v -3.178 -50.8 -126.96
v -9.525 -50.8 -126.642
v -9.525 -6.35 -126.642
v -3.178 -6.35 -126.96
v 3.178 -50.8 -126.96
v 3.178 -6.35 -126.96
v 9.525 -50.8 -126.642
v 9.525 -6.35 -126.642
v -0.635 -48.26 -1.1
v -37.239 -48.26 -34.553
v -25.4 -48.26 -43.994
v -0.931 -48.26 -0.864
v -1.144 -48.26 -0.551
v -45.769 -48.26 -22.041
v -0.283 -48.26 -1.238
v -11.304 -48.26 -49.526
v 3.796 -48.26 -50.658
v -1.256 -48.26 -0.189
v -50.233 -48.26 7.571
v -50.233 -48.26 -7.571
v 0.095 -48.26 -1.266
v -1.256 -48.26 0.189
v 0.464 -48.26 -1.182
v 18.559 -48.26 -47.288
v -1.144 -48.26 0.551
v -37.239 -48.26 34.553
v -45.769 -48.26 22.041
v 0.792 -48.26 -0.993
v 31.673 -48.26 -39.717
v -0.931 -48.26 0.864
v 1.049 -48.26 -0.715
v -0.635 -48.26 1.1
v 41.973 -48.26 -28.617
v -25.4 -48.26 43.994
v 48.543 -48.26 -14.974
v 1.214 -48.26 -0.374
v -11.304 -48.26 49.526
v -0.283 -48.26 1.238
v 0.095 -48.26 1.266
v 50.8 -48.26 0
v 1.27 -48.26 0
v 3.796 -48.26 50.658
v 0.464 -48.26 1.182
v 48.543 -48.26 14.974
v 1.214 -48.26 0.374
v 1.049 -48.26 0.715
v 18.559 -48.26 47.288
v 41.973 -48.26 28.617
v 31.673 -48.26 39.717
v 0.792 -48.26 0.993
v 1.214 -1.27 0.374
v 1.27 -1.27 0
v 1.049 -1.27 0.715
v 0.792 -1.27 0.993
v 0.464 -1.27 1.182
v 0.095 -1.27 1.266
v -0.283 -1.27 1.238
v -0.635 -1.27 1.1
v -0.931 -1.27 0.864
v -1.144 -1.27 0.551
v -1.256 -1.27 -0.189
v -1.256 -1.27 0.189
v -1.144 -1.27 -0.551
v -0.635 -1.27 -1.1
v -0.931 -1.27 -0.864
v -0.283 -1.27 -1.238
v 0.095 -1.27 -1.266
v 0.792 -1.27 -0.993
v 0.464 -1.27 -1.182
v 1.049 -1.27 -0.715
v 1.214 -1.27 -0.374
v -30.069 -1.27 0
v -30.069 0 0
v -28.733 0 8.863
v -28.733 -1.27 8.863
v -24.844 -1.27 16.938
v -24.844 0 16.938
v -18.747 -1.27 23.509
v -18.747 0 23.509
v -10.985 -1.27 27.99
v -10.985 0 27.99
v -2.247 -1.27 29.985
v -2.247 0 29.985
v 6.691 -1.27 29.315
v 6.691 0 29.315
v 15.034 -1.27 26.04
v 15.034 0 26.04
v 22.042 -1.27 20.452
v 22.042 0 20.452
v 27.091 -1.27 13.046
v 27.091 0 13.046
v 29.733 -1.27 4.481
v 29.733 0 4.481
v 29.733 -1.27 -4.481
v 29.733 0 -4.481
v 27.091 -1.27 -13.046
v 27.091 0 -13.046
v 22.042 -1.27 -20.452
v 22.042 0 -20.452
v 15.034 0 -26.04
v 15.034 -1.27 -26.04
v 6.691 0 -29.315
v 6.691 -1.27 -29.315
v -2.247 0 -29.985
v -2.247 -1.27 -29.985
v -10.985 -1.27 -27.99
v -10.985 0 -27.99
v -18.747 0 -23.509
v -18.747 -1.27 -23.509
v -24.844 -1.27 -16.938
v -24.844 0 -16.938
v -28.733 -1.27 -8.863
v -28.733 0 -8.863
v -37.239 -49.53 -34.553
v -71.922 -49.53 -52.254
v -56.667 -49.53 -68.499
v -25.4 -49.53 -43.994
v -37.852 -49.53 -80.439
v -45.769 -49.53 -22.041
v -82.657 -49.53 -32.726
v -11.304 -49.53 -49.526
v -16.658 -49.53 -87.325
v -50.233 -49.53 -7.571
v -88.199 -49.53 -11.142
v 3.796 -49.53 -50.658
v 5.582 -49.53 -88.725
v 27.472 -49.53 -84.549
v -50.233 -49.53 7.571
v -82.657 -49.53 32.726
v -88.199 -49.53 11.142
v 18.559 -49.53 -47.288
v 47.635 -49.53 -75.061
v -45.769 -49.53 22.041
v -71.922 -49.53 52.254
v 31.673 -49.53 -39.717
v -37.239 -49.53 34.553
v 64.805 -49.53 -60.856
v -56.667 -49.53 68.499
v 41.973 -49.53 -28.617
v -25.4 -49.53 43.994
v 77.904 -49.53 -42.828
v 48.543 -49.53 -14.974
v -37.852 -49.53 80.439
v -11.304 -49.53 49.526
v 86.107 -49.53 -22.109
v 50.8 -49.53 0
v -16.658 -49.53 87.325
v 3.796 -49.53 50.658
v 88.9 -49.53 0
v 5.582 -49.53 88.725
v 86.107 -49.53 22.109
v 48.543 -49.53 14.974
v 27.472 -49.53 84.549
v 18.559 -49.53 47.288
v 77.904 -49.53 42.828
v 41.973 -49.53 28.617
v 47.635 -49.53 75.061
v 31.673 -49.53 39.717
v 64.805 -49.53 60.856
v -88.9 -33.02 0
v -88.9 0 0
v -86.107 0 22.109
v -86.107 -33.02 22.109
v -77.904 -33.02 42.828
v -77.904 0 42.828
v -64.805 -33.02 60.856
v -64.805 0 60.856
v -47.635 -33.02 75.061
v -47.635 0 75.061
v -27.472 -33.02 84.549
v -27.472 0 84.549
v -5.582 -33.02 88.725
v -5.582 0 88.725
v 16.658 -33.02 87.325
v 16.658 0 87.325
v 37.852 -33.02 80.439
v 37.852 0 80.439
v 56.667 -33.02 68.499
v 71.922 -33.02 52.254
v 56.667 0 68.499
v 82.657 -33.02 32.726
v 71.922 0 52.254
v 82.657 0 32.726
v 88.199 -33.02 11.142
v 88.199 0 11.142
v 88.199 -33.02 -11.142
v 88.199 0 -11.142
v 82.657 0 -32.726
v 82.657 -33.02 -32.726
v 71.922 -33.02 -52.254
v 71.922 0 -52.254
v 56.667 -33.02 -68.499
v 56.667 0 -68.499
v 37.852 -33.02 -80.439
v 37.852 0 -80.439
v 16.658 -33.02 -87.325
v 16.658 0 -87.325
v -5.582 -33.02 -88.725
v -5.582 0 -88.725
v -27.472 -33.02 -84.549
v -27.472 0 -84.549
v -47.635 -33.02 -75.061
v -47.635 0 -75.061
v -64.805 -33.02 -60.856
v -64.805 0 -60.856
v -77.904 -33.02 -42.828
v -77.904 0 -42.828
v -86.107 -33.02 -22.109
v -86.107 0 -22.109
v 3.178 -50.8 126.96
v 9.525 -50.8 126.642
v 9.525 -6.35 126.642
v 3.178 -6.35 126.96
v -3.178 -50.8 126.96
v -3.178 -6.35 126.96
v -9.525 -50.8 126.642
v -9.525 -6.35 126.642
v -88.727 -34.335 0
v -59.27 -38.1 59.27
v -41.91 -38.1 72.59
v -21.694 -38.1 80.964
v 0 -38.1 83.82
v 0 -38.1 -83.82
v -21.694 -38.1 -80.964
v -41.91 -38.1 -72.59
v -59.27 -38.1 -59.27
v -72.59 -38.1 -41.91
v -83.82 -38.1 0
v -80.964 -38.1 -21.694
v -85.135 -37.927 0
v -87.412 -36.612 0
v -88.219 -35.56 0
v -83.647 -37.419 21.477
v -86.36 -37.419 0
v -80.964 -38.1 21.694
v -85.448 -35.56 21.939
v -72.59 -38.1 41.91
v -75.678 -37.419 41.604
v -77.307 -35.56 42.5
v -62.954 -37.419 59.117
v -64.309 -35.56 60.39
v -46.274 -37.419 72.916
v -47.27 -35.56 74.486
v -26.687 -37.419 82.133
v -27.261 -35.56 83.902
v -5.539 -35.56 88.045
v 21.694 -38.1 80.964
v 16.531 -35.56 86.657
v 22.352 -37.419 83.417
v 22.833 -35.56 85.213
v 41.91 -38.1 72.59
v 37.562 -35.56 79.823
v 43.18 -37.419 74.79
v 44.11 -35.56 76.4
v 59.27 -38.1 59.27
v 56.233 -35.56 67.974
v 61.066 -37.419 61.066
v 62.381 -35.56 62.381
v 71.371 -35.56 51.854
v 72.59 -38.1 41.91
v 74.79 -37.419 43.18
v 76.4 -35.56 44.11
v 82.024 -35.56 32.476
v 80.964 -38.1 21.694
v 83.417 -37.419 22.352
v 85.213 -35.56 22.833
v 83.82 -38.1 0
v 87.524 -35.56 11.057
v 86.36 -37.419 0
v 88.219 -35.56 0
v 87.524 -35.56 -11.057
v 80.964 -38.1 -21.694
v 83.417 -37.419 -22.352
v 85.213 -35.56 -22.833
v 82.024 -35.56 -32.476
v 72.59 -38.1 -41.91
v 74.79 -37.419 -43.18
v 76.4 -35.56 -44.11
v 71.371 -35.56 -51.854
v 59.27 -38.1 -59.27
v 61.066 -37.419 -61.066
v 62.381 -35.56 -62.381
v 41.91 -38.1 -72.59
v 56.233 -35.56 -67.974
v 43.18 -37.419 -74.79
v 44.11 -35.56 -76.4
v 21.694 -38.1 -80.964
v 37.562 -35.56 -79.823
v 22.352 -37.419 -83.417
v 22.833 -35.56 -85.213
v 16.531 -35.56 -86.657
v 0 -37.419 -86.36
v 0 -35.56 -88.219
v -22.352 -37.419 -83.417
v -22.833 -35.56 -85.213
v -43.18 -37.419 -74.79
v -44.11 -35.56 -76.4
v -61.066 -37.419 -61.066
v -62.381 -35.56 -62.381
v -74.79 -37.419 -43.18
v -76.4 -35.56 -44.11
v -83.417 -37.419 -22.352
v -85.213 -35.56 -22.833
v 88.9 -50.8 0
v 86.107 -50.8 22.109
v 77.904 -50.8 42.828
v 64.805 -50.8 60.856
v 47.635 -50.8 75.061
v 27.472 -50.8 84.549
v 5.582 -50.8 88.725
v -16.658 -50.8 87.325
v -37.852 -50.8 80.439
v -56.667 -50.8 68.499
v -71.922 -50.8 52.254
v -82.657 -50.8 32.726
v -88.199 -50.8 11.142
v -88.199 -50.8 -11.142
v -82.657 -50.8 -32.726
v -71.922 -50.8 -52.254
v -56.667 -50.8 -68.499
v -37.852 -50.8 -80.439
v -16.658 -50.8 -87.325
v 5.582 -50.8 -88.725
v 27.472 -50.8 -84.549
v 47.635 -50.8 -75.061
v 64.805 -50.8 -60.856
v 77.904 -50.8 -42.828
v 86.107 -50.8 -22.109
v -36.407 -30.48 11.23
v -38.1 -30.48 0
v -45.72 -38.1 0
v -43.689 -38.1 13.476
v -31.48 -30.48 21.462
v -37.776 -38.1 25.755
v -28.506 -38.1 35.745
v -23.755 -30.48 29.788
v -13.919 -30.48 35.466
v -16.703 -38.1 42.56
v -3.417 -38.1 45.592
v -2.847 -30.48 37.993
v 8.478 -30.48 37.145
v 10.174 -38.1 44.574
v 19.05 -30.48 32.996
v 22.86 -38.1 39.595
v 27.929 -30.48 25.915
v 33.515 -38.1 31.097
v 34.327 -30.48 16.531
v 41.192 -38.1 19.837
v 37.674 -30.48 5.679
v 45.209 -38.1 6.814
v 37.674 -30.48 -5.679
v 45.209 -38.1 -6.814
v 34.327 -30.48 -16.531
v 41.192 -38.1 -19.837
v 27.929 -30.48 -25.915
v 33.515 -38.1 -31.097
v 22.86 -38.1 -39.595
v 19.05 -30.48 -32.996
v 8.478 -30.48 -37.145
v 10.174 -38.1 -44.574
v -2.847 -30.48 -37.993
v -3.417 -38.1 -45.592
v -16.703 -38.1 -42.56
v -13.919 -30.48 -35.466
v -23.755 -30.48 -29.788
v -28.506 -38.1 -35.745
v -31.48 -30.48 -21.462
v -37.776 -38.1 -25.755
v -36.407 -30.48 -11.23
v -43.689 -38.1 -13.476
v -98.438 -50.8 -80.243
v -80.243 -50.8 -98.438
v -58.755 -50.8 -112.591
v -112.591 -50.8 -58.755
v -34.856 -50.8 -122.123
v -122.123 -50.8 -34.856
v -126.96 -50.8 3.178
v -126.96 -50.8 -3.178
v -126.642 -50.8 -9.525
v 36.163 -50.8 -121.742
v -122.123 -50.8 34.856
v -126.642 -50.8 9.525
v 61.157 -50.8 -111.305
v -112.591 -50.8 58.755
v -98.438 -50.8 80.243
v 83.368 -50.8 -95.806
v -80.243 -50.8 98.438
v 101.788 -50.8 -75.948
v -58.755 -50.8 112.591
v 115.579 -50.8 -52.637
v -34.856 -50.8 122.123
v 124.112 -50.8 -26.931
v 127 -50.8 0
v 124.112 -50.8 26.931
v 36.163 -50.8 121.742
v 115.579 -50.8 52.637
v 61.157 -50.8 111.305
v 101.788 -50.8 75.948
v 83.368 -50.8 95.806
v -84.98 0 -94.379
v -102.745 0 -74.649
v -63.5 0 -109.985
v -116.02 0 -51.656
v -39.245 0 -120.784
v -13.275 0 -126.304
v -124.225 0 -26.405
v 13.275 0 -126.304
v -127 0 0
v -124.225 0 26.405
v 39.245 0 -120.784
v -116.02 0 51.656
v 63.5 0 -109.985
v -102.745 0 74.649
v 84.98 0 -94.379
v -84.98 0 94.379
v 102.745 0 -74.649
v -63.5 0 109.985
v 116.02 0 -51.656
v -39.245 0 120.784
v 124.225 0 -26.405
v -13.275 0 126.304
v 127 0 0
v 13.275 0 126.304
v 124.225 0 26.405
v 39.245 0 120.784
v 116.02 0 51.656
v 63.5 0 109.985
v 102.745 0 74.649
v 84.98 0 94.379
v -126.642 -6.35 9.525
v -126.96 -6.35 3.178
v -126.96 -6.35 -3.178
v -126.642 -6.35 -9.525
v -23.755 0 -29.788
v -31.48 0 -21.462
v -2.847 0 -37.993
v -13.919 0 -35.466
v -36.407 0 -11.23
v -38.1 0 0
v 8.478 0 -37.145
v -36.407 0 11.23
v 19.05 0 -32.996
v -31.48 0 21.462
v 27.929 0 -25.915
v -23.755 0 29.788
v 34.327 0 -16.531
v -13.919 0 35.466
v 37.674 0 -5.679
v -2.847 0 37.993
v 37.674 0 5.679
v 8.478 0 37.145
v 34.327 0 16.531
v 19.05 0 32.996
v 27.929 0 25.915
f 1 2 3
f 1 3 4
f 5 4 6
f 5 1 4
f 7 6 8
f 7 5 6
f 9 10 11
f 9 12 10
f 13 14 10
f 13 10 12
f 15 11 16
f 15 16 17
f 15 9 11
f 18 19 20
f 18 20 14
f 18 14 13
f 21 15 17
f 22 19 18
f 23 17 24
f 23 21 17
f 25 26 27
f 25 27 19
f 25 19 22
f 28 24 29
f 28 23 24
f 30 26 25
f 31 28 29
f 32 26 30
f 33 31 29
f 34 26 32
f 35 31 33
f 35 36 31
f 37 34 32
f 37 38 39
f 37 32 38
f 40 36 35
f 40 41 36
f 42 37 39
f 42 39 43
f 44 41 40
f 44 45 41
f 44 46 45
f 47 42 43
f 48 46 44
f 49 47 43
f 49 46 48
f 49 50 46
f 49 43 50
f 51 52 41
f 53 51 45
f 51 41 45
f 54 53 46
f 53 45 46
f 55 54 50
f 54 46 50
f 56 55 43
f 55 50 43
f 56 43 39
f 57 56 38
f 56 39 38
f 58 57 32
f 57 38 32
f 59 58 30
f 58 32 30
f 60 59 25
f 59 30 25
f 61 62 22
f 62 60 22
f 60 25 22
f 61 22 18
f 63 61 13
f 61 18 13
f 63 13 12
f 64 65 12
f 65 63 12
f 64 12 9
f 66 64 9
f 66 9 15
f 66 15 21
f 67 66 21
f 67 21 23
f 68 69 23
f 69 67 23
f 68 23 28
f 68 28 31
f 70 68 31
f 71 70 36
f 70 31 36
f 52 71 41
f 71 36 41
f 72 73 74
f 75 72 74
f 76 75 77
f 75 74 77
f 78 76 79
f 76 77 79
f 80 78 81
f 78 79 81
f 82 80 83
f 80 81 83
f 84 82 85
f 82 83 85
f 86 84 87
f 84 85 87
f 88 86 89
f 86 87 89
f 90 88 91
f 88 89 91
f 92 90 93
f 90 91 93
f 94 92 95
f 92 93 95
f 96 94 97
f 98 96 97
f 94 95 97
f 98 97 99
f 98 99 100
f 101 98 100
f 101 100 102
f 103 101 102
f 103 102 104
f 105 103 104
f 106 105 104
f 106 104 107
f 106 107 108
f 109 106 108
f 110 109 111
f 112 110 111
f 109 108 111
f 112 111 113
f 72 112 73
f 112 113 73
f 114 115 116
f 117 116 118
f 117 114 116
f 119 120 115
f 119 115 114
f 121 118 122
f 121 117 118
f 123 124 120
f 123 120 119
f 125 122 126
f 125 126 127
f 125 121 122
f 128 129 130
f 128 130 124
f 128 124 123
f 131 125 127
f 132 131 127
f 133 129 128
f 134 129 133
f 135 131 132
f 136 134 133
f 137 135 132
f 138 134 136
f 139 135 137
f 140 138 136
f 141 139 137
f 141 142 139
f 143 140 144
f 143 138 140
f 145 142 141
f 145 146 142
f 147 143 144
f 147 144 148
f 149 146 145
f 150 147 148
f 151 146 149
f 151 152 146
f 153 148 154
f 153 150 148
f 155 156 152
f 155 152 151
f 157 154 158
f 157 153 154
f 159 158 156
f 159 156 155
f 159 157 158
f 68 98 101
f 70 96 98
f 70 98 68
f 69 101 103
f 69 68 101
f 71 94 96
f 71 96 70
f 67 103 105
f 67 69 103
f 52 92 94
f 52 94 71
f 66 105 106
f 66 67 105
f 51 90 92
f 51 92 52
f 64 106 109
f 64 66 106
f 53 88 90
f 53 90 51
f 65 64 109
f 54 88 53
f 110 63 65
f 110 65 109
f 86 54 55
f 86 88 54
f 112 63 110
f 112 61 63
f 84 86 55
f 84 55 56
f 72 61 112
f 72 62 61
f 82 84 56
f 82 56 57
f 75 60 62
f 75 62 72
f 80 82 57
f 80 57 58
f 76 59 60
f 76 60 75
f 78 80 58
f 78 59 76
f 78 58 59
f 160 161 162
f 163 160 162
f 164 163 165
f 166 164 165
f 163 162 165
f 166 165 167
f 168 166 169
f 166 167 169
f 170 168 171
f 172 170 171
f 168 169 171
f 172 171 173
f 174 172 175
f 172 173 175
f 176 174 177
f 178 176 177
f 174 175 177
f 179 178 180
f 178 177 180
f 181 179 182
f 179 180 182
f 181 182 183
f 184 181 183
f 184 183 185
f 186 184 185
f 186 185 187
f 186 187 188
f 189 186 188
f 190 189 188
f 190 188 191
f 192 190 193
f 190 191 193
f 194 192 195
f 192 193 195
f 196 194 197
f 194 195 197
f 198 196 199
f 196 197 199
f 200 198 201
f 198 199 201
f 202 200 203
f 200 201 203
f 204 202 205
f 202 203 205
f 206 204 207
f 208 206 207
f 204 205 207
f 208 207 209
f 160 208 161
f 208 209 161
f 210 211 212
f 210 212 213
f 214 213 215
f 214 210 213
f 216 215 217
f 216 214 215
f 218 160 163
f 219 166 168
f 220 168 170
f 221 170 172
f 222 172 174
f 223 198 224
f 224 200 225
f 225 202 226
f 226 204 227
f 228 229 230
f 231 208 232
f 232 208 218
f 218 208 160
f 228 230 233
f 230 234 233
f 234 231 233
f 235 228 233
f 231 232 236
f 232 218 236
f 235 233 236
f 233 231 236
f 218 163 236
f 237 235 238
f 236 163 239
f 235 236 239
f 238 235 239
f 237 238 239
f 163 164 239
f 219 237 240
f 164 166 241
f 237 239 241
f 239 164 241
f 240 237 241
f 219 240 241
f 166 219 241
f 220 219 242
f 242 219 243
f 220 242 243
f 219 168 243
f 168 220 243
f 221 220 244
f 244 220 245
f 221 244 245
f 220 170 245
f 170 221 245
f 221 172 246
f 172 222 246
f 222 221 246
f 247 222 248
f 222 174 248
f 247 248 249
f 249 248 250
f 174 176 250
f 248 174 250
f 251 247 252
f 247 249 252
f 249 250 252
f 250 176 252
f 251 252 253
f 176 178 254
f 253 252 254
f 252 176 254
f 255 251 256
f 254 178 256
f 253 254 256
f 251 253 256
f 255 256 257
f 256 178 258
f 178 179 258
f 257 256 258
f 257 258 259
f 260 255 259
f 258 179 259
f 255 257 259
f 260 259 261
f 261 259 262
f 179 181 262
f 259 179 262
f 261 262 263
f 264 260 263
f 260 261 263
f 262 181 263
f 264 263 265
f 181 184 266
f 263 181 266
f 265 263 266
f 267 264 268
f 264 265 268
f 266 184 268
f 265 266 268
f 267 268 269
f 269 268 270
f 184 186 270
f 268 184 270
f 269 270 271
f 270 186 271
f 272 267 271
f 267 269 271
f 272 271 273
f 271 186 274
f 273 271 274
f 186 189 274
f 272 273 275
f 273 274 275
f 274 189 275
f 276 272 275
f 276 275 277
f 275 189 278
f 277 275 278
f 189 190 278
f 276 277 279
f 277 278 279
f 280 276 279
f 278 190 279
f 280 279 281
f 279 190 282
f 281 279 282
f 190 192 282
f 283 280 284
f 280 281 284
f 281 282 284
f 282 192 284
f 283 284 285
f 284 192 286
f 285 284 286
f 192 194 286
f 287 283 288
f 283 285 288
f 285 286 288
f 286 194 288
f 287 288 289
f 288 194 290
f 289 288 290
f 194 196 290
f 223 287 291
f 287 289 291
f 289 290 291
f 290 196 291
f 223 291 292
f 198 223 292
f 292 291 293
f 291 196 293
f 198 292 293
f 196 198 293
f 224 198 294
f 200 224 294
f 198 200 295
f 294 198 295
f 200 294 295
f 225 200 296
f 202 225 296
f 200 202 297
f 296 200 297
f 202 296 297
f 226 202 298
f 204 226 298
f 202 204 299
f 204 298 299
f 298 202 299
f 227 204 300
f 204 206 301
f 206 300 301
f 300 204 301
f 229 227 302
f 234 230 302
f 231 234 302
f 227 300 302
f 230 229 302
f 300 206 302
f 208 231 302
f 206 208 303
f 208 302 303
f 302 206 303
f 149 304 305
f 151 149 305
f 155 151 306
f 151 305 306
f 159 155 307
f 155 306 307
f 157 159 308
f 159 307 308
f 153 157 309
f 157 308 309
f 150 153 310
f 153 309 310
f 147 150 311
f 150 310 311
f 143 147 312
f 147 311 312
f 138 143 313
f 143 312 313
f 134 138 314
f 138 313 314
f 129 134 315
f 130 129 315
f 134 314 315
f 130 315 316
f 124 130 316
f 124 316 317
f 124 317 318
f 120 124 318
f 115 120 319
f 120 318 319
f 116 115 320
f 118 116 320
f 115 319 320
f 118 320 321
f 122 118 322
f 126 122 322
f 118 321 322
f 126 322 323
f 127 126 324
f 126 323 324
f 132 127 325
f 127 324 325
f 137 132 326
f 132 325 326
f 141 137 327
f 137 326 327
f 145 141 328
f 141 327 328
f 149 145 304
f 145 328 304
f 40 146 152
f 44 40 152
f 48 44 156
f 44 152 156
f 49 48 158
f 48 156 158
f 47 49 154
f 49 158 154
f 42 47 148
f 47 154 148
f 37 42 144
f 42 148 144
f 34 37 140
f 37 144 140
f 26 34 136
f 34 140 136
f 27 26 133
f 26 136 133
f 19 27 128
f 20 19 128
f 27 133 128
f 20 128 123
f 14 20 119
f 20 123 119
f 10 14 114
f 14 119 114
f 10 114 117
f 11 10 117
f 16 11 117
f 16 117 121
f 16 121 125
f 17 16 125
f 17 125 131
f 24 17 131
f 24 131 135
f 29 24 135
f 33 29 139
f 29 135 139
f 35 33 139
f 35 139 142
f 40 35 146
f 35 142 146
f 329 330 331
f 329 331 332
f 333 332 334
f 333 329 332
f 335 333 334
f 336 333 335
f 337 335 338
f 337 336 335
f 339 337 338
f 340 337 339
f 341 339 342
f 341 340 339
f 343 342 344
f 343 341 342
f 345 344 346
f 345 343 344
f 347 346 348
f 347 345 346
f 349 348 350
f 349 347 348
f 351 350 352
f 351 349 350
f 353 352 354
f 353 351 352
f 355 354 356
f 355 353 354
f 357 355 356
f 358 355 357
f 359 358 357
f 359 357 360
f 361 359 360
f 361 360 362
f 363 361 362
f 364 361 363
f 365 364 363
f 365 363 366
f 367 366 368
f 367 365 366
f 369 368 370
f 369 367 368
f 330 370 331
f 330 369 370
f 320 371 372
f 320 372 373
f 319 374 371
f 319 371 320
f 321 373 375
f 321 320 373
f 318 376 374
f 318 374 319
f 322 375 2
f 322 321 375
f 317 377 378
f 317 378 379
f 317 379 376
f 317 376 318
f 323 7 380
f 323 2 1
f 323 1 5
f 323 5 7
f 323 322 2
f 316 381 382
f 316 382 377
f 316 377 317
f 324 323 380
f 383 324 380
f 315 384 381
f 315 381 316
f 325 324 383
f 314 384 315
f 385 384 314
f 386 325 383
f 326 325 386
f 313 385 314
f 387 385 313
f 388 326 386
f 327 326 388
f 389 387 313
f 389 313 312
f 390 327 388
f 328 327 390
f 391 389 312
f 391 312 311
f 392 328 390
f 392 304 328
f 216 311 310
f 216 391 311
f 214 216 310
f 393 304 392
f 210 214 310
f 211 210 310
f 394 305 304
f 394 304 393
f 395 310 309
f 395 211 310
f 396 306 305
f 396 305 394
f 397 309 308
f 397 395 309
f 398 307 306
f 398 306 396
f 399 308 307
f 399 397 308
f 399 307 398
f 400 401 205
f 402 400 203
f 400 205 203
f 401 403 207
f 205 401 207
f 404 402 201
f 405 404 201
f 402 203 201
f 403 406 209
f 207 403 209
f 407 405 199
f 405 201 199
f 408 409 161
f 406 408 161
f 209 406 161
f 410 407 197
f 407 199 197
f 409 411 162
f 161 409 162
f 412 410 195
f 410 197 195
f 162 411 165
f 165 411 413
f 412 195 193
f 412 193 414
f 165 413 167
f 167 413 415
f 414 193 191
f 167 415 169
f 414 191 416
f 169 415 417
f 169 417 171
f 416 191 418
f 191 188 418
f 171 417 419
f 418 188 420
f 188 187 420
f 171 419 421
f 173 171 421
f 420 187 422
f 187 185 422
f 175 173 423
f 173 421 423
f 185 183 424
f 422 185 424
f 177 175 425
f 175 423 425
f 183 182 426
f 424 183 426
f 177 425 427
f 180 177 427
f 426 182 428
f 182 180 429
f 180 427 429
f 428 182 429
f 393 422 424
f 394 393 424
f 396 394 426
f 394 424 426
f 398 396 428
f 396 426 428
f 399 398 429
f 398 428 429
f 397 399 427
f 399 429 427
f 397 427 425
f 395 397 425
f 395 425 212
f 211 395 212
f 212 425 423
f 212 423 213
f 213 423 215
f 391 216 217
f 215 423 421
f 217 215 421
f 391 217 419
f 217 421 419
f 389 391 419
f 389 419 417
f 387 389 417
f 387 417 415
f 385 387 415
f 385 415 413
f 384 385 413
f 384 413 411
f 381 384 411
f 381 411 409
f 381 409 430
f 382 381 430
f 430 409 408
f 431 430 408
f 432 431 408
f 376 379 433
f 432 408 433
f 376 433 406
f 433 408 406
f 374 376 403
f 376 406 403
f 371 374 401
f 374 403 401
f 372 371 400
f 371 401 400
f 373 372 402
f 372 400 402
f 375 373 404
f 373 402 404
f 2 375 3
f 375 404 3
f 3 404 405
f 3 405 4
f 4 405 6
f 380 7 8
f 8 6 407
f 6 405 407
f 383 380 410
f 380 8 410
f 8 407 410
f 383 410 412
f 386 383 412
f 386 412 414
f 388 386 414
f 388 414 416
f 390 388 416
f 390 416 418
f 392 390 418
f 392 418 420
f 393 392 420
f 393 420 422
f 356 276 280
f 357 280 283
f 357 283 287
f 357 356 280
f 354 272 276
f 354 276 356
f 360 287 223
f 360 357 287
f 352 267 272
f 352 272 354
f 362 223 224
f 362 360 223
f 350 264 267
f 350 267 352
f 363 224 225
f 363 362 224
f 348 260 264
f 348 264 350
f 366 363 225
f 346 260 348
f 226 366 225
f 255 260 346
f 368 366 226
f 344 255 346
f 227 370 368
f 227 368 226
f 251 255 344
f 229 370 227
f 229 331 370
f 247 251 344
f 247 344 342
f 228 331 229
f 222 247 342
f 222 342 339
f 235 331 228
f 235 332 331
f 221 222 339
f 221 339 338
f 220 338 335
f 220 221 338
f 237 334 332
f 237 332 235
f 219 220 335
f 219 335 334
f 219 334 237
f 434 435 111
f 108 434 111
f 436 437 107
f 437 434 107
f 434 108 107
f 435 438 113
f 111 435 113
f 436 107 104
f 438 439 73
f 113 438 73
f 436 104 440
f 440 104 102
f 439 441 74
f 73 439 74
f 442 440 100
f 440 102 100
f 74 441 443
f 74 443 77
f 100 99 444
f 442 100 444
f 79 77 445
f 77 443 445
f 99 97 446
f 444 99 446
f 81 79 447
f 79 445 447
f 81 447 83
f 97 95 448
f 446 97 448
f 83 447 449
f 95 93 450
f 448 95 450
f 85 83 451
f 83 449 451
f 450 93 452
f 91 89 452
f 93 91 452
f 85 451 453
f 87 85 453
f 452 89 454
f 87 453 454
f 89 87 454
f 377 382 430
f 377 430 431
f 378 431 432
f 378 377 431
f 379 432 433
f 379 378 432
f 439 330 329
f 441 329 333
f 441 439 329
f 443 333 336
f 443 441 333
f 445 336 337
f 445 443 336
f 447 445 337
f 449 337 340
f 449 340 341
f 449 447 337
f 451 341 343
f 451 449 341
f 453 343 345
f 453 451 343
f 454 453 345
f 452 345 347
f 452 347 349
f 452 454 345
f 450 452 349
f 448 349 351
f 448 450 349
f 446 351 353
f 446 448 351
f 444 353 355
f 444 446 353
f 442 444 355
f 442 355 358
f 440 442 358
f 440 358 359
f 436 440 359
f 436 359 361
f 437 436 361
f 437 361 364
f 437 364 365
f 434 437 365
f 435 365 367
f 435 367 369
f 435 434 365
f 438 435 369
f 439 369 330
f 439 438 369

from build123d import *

# Parameters (mm, degrees)
F0_R      = 127
F1_DEPTH  = 50.8
F2_R      = 88.9
F3_DEPTH  = 1.27
F4_R      = 1.27
F5_DEPTH  = 50.8
F6_R      = 50.8
F7_DEPTH  = 1.27
F8_R      = 88.9
F8_R_2    = 38.1
F9_DEPTH  = 38.1
F10_SIZE  = 7.62
F11_R     = 5.08
F13_DEPTH = 44.45
F14_R     = 30.068591
F14_R_2   = 1.27
F15_DEPTH = 1.27


with BuildPart() as f1:
    # F0 (on Front) → F1 (new body)
    with BuildSketch(Plane.XZ):
        Circle(F0_R)
    extrude(amount=F1_DEPTH)

    # F2 (on face) → F3 (cut)
    with BuildSketch(Plane.XZ.offset(50.8)):
        Circle(F2_R)
    extrude(amount=-F3_DEPTH, mode=Mode.SUBTRACT)

    # F4 (on face) → F5 (cut)
    with BuildSketch(Plane.XZ.offset(49.53)):
        Circle(F4_R)
    extrude(amount=-F5_DEPTH, mode=Mode.SUBTRACT)

    # F6 (on face) → F7 (cut)
    with BuildSketch(Plane.XZ.offset(49.53)):
        Circle(F6_R)
    extrude(amount=-F7_DEPTH, mode=Mode.SUBTRACT)

    # F8 (on face) → F9 (cut)
    with BuildSketch(Plane(origin=(0, 0, 0), x_dir=(-1, 0, 0), z_dir=(0, 1, 0))):
        Circle(F8_R)
        Circle(F8_R_2, mode=Mode.SUBTRACT)
    extrude(amount=-F9_DEPTH, mode=Mode.SUBTRACT)

    # F10
    f10_edges = [f1.edges().sort_by_distance(p)[0] for p in [
        (38.1, -38.1, 0),
    ]]
    chamfer(f10_edges, length=F10_SIZE)

    # F11
    f11_edges = [f1.edges().sort_by_distance(p)[0] for p in [
        (88.9, -38.1, 0),
    ]]
    fillet(f11_edges, radius=F11_R)

    # F12 (on face) → F13 (join)
    with BuildSketch(Plane.XZ.offset(50.8)):
        with BuildLine():
            ThreePointArc((-2.998611, 107.908345), (0, 107.95), (2.998611, 107.908345))
            ThreePointArc((2.998611, 107.908345), (7.602326, 109.70383), (9.525, 114.255894))
            Line((9.525, 114.255894), (9.525, 126.642309))
            ThreePointArc((9.525, 126.642309), (0, 127), (-9.525, 126.642309))
            Line((-9.525, 126.642309), (-9.525, 114.255894))
            ThreePointArc((-9.525, 114.255894), (-7.602326, 109.70383), (-2.998611, 107.908345))
        make_face()
        with BuildLine():
            Line((-74.055926, 87.52631), (-82.814443, 96.284827))
            ThreePointArc((-82.814443, 96.284827), (-89.802561, 89.802561), (-96.284827, 82.814443))
            Line((-96.284827, 82.814443), (-87.52631, 74.055926))
            ThreePointArc((-87.52631, 74.055926), (-82.947979, 72.196666), (-78.42306, 74.182384))
            ThreePointArc((-78.42306, 74.182384), (-76.332177, 76.332177), (-74.182384, 78.42306))
            ThreePointArc((-74.182384, 78.42306), (-72.196666, 82.947979), (-74.055926, 87.52631))
        make_face()
        with BuildLine():
            Line((-114.255894, 9.525), (-126.642309, 9.525))
            ThreePointArc((-126.642309, 9.525), (-127, 0), (-126.642309, -9.525))
            Line((-126.642309, -9.525), (-114.255894, -9.525))
            ThreePointArc((-114.255894, -9.525), (-109.70383, -7.602326), (-107.908345, -2.998611))
            ThreePointArc((-107.908345, -2.998611), (-107.95, 0), (-107.908345, 2.998611))
            ThreePointArc((-107.908345, 2.998611), (-109.70383, 7.602326), (-114.255894, 9.525))
        make_face()
        with BuildLine():
            Line((-87.52631, -74.055926), (-96.284827, -82.814443))
            ThreePointArc((-96.284827, -82.814443), (-89.802561, -89.802561), (-82.814443, -96.284827))
            Line((-82.814443, -96.284827), (-74.055926, -87.52631))
            ThreePointArc((-74.055926, -87.52631), (-72.196666, -82.947979), (-74.182384, -78.42306))
            ThreePointArc((-74.182384, -78.42306), (-76.332177, -76.332177), (-78.42306, -74.182384))
            ThreePointArc((-78.42306, -74.182384), (-82.947979, -72.196666), (-87.52631, -74.055926))
        make_face()
        with BuildLine():
            Line((-9.525, -114.255894), (-9.525, -126.642309))
            ThreePointArc((-9.525, -126.642309), (0, -127), (9.525, -126.642309))
            Line((9.525, -126.642309), (9.525, -114.255894))
            ThreePointArc((9.525, -114.255894), (7.602326, -109.70383), (2.998611, -107.908345))
            ThreePointArc((2.998611, -107.908345), (0, -107.95), (-2.998611, -107.908345))
            ThreePointArc((-2.998611, -107.908345), (-7.602326, -109.70383), (-9.525, -114.255894))
        make_face()
        with BuildLine():
            Line((74.055926, -87.52631), (82.814443, -96.284827))
            ThreePointArc((82.814443, -96.284827), (89.802561, -89.802561), (96.284827, -82.814443))
            Line((96.284827, -82.814443), (87.52631, -74.055926))
            ThreePointArc((87.52631, -74.055926), (82.947979, -72.196666), (78.42306, -74.182384))
            ThreePointArc((78.42306, -74.182384), (76.332177, -76.332177), (74.182384, -78.42306))
            ThreePointArc((74.182384, -78.42306), (72.196666, -82.947979), (74.055926, -87.52631))
        make_face()
        with BuildLine():
            Line((114.255894, -9.525), (126.642309, -9.525))
            ThreePointArc((126.642309, -9.525), (127, 0), (126.642309, 9.525))
            Line((126.642309, 9.525), (114.255894, 9.525))
            ThreePointArc((114.255894, 9.525), (109.70383, 7.602326), (107.908345, 2.998611))
            ThreePointArc((107.908345, 2.998611), (107.95, 0), (107.908345, -2.998611))
            ThreePointArc((107.908345, -2.998611), (109.70383, -7.602326), (114.255894, -9.525))
        make_face()
        with BuildLine():
            Line((87.52631, 74.055926), (96.284827, 82.814443))
            ThreePointArc((96.284827, 82.814443), (89.802561, 89.802561), (82.814443, 96.284827))
            Line((82.814443, 96.284827), (74.055926, 87.52631))
            ThreePointArc((74.055926, 87.52631), (72.196666, 82.947979), (74.182384, 78.42306))
            ThreePointArc((74.182384, 78.42306), (76.332177, 76.332177), (78.42306, 74.182384))
            ThreePointArc((78.42306, 74.182384), (82.947979, 72.196666), (87.52631, 74.055926))
        make_face()
    extrude(amount=-F13_DEPTH)

    # F14 (on face) → F15 (cut)
    with BuildSketch(Plane(origin=(0, 0, 0), x_dir=(-1, 0, 0), z_dir=(0, 1, 0))):
        Circle(F14_R)
        Circle(F14_R_2, mode=Mode.SUBTRACT)
    extrude(amount=-F15_DEPTH, mode=Mode.SUBTRACT)


solid = f1.part
